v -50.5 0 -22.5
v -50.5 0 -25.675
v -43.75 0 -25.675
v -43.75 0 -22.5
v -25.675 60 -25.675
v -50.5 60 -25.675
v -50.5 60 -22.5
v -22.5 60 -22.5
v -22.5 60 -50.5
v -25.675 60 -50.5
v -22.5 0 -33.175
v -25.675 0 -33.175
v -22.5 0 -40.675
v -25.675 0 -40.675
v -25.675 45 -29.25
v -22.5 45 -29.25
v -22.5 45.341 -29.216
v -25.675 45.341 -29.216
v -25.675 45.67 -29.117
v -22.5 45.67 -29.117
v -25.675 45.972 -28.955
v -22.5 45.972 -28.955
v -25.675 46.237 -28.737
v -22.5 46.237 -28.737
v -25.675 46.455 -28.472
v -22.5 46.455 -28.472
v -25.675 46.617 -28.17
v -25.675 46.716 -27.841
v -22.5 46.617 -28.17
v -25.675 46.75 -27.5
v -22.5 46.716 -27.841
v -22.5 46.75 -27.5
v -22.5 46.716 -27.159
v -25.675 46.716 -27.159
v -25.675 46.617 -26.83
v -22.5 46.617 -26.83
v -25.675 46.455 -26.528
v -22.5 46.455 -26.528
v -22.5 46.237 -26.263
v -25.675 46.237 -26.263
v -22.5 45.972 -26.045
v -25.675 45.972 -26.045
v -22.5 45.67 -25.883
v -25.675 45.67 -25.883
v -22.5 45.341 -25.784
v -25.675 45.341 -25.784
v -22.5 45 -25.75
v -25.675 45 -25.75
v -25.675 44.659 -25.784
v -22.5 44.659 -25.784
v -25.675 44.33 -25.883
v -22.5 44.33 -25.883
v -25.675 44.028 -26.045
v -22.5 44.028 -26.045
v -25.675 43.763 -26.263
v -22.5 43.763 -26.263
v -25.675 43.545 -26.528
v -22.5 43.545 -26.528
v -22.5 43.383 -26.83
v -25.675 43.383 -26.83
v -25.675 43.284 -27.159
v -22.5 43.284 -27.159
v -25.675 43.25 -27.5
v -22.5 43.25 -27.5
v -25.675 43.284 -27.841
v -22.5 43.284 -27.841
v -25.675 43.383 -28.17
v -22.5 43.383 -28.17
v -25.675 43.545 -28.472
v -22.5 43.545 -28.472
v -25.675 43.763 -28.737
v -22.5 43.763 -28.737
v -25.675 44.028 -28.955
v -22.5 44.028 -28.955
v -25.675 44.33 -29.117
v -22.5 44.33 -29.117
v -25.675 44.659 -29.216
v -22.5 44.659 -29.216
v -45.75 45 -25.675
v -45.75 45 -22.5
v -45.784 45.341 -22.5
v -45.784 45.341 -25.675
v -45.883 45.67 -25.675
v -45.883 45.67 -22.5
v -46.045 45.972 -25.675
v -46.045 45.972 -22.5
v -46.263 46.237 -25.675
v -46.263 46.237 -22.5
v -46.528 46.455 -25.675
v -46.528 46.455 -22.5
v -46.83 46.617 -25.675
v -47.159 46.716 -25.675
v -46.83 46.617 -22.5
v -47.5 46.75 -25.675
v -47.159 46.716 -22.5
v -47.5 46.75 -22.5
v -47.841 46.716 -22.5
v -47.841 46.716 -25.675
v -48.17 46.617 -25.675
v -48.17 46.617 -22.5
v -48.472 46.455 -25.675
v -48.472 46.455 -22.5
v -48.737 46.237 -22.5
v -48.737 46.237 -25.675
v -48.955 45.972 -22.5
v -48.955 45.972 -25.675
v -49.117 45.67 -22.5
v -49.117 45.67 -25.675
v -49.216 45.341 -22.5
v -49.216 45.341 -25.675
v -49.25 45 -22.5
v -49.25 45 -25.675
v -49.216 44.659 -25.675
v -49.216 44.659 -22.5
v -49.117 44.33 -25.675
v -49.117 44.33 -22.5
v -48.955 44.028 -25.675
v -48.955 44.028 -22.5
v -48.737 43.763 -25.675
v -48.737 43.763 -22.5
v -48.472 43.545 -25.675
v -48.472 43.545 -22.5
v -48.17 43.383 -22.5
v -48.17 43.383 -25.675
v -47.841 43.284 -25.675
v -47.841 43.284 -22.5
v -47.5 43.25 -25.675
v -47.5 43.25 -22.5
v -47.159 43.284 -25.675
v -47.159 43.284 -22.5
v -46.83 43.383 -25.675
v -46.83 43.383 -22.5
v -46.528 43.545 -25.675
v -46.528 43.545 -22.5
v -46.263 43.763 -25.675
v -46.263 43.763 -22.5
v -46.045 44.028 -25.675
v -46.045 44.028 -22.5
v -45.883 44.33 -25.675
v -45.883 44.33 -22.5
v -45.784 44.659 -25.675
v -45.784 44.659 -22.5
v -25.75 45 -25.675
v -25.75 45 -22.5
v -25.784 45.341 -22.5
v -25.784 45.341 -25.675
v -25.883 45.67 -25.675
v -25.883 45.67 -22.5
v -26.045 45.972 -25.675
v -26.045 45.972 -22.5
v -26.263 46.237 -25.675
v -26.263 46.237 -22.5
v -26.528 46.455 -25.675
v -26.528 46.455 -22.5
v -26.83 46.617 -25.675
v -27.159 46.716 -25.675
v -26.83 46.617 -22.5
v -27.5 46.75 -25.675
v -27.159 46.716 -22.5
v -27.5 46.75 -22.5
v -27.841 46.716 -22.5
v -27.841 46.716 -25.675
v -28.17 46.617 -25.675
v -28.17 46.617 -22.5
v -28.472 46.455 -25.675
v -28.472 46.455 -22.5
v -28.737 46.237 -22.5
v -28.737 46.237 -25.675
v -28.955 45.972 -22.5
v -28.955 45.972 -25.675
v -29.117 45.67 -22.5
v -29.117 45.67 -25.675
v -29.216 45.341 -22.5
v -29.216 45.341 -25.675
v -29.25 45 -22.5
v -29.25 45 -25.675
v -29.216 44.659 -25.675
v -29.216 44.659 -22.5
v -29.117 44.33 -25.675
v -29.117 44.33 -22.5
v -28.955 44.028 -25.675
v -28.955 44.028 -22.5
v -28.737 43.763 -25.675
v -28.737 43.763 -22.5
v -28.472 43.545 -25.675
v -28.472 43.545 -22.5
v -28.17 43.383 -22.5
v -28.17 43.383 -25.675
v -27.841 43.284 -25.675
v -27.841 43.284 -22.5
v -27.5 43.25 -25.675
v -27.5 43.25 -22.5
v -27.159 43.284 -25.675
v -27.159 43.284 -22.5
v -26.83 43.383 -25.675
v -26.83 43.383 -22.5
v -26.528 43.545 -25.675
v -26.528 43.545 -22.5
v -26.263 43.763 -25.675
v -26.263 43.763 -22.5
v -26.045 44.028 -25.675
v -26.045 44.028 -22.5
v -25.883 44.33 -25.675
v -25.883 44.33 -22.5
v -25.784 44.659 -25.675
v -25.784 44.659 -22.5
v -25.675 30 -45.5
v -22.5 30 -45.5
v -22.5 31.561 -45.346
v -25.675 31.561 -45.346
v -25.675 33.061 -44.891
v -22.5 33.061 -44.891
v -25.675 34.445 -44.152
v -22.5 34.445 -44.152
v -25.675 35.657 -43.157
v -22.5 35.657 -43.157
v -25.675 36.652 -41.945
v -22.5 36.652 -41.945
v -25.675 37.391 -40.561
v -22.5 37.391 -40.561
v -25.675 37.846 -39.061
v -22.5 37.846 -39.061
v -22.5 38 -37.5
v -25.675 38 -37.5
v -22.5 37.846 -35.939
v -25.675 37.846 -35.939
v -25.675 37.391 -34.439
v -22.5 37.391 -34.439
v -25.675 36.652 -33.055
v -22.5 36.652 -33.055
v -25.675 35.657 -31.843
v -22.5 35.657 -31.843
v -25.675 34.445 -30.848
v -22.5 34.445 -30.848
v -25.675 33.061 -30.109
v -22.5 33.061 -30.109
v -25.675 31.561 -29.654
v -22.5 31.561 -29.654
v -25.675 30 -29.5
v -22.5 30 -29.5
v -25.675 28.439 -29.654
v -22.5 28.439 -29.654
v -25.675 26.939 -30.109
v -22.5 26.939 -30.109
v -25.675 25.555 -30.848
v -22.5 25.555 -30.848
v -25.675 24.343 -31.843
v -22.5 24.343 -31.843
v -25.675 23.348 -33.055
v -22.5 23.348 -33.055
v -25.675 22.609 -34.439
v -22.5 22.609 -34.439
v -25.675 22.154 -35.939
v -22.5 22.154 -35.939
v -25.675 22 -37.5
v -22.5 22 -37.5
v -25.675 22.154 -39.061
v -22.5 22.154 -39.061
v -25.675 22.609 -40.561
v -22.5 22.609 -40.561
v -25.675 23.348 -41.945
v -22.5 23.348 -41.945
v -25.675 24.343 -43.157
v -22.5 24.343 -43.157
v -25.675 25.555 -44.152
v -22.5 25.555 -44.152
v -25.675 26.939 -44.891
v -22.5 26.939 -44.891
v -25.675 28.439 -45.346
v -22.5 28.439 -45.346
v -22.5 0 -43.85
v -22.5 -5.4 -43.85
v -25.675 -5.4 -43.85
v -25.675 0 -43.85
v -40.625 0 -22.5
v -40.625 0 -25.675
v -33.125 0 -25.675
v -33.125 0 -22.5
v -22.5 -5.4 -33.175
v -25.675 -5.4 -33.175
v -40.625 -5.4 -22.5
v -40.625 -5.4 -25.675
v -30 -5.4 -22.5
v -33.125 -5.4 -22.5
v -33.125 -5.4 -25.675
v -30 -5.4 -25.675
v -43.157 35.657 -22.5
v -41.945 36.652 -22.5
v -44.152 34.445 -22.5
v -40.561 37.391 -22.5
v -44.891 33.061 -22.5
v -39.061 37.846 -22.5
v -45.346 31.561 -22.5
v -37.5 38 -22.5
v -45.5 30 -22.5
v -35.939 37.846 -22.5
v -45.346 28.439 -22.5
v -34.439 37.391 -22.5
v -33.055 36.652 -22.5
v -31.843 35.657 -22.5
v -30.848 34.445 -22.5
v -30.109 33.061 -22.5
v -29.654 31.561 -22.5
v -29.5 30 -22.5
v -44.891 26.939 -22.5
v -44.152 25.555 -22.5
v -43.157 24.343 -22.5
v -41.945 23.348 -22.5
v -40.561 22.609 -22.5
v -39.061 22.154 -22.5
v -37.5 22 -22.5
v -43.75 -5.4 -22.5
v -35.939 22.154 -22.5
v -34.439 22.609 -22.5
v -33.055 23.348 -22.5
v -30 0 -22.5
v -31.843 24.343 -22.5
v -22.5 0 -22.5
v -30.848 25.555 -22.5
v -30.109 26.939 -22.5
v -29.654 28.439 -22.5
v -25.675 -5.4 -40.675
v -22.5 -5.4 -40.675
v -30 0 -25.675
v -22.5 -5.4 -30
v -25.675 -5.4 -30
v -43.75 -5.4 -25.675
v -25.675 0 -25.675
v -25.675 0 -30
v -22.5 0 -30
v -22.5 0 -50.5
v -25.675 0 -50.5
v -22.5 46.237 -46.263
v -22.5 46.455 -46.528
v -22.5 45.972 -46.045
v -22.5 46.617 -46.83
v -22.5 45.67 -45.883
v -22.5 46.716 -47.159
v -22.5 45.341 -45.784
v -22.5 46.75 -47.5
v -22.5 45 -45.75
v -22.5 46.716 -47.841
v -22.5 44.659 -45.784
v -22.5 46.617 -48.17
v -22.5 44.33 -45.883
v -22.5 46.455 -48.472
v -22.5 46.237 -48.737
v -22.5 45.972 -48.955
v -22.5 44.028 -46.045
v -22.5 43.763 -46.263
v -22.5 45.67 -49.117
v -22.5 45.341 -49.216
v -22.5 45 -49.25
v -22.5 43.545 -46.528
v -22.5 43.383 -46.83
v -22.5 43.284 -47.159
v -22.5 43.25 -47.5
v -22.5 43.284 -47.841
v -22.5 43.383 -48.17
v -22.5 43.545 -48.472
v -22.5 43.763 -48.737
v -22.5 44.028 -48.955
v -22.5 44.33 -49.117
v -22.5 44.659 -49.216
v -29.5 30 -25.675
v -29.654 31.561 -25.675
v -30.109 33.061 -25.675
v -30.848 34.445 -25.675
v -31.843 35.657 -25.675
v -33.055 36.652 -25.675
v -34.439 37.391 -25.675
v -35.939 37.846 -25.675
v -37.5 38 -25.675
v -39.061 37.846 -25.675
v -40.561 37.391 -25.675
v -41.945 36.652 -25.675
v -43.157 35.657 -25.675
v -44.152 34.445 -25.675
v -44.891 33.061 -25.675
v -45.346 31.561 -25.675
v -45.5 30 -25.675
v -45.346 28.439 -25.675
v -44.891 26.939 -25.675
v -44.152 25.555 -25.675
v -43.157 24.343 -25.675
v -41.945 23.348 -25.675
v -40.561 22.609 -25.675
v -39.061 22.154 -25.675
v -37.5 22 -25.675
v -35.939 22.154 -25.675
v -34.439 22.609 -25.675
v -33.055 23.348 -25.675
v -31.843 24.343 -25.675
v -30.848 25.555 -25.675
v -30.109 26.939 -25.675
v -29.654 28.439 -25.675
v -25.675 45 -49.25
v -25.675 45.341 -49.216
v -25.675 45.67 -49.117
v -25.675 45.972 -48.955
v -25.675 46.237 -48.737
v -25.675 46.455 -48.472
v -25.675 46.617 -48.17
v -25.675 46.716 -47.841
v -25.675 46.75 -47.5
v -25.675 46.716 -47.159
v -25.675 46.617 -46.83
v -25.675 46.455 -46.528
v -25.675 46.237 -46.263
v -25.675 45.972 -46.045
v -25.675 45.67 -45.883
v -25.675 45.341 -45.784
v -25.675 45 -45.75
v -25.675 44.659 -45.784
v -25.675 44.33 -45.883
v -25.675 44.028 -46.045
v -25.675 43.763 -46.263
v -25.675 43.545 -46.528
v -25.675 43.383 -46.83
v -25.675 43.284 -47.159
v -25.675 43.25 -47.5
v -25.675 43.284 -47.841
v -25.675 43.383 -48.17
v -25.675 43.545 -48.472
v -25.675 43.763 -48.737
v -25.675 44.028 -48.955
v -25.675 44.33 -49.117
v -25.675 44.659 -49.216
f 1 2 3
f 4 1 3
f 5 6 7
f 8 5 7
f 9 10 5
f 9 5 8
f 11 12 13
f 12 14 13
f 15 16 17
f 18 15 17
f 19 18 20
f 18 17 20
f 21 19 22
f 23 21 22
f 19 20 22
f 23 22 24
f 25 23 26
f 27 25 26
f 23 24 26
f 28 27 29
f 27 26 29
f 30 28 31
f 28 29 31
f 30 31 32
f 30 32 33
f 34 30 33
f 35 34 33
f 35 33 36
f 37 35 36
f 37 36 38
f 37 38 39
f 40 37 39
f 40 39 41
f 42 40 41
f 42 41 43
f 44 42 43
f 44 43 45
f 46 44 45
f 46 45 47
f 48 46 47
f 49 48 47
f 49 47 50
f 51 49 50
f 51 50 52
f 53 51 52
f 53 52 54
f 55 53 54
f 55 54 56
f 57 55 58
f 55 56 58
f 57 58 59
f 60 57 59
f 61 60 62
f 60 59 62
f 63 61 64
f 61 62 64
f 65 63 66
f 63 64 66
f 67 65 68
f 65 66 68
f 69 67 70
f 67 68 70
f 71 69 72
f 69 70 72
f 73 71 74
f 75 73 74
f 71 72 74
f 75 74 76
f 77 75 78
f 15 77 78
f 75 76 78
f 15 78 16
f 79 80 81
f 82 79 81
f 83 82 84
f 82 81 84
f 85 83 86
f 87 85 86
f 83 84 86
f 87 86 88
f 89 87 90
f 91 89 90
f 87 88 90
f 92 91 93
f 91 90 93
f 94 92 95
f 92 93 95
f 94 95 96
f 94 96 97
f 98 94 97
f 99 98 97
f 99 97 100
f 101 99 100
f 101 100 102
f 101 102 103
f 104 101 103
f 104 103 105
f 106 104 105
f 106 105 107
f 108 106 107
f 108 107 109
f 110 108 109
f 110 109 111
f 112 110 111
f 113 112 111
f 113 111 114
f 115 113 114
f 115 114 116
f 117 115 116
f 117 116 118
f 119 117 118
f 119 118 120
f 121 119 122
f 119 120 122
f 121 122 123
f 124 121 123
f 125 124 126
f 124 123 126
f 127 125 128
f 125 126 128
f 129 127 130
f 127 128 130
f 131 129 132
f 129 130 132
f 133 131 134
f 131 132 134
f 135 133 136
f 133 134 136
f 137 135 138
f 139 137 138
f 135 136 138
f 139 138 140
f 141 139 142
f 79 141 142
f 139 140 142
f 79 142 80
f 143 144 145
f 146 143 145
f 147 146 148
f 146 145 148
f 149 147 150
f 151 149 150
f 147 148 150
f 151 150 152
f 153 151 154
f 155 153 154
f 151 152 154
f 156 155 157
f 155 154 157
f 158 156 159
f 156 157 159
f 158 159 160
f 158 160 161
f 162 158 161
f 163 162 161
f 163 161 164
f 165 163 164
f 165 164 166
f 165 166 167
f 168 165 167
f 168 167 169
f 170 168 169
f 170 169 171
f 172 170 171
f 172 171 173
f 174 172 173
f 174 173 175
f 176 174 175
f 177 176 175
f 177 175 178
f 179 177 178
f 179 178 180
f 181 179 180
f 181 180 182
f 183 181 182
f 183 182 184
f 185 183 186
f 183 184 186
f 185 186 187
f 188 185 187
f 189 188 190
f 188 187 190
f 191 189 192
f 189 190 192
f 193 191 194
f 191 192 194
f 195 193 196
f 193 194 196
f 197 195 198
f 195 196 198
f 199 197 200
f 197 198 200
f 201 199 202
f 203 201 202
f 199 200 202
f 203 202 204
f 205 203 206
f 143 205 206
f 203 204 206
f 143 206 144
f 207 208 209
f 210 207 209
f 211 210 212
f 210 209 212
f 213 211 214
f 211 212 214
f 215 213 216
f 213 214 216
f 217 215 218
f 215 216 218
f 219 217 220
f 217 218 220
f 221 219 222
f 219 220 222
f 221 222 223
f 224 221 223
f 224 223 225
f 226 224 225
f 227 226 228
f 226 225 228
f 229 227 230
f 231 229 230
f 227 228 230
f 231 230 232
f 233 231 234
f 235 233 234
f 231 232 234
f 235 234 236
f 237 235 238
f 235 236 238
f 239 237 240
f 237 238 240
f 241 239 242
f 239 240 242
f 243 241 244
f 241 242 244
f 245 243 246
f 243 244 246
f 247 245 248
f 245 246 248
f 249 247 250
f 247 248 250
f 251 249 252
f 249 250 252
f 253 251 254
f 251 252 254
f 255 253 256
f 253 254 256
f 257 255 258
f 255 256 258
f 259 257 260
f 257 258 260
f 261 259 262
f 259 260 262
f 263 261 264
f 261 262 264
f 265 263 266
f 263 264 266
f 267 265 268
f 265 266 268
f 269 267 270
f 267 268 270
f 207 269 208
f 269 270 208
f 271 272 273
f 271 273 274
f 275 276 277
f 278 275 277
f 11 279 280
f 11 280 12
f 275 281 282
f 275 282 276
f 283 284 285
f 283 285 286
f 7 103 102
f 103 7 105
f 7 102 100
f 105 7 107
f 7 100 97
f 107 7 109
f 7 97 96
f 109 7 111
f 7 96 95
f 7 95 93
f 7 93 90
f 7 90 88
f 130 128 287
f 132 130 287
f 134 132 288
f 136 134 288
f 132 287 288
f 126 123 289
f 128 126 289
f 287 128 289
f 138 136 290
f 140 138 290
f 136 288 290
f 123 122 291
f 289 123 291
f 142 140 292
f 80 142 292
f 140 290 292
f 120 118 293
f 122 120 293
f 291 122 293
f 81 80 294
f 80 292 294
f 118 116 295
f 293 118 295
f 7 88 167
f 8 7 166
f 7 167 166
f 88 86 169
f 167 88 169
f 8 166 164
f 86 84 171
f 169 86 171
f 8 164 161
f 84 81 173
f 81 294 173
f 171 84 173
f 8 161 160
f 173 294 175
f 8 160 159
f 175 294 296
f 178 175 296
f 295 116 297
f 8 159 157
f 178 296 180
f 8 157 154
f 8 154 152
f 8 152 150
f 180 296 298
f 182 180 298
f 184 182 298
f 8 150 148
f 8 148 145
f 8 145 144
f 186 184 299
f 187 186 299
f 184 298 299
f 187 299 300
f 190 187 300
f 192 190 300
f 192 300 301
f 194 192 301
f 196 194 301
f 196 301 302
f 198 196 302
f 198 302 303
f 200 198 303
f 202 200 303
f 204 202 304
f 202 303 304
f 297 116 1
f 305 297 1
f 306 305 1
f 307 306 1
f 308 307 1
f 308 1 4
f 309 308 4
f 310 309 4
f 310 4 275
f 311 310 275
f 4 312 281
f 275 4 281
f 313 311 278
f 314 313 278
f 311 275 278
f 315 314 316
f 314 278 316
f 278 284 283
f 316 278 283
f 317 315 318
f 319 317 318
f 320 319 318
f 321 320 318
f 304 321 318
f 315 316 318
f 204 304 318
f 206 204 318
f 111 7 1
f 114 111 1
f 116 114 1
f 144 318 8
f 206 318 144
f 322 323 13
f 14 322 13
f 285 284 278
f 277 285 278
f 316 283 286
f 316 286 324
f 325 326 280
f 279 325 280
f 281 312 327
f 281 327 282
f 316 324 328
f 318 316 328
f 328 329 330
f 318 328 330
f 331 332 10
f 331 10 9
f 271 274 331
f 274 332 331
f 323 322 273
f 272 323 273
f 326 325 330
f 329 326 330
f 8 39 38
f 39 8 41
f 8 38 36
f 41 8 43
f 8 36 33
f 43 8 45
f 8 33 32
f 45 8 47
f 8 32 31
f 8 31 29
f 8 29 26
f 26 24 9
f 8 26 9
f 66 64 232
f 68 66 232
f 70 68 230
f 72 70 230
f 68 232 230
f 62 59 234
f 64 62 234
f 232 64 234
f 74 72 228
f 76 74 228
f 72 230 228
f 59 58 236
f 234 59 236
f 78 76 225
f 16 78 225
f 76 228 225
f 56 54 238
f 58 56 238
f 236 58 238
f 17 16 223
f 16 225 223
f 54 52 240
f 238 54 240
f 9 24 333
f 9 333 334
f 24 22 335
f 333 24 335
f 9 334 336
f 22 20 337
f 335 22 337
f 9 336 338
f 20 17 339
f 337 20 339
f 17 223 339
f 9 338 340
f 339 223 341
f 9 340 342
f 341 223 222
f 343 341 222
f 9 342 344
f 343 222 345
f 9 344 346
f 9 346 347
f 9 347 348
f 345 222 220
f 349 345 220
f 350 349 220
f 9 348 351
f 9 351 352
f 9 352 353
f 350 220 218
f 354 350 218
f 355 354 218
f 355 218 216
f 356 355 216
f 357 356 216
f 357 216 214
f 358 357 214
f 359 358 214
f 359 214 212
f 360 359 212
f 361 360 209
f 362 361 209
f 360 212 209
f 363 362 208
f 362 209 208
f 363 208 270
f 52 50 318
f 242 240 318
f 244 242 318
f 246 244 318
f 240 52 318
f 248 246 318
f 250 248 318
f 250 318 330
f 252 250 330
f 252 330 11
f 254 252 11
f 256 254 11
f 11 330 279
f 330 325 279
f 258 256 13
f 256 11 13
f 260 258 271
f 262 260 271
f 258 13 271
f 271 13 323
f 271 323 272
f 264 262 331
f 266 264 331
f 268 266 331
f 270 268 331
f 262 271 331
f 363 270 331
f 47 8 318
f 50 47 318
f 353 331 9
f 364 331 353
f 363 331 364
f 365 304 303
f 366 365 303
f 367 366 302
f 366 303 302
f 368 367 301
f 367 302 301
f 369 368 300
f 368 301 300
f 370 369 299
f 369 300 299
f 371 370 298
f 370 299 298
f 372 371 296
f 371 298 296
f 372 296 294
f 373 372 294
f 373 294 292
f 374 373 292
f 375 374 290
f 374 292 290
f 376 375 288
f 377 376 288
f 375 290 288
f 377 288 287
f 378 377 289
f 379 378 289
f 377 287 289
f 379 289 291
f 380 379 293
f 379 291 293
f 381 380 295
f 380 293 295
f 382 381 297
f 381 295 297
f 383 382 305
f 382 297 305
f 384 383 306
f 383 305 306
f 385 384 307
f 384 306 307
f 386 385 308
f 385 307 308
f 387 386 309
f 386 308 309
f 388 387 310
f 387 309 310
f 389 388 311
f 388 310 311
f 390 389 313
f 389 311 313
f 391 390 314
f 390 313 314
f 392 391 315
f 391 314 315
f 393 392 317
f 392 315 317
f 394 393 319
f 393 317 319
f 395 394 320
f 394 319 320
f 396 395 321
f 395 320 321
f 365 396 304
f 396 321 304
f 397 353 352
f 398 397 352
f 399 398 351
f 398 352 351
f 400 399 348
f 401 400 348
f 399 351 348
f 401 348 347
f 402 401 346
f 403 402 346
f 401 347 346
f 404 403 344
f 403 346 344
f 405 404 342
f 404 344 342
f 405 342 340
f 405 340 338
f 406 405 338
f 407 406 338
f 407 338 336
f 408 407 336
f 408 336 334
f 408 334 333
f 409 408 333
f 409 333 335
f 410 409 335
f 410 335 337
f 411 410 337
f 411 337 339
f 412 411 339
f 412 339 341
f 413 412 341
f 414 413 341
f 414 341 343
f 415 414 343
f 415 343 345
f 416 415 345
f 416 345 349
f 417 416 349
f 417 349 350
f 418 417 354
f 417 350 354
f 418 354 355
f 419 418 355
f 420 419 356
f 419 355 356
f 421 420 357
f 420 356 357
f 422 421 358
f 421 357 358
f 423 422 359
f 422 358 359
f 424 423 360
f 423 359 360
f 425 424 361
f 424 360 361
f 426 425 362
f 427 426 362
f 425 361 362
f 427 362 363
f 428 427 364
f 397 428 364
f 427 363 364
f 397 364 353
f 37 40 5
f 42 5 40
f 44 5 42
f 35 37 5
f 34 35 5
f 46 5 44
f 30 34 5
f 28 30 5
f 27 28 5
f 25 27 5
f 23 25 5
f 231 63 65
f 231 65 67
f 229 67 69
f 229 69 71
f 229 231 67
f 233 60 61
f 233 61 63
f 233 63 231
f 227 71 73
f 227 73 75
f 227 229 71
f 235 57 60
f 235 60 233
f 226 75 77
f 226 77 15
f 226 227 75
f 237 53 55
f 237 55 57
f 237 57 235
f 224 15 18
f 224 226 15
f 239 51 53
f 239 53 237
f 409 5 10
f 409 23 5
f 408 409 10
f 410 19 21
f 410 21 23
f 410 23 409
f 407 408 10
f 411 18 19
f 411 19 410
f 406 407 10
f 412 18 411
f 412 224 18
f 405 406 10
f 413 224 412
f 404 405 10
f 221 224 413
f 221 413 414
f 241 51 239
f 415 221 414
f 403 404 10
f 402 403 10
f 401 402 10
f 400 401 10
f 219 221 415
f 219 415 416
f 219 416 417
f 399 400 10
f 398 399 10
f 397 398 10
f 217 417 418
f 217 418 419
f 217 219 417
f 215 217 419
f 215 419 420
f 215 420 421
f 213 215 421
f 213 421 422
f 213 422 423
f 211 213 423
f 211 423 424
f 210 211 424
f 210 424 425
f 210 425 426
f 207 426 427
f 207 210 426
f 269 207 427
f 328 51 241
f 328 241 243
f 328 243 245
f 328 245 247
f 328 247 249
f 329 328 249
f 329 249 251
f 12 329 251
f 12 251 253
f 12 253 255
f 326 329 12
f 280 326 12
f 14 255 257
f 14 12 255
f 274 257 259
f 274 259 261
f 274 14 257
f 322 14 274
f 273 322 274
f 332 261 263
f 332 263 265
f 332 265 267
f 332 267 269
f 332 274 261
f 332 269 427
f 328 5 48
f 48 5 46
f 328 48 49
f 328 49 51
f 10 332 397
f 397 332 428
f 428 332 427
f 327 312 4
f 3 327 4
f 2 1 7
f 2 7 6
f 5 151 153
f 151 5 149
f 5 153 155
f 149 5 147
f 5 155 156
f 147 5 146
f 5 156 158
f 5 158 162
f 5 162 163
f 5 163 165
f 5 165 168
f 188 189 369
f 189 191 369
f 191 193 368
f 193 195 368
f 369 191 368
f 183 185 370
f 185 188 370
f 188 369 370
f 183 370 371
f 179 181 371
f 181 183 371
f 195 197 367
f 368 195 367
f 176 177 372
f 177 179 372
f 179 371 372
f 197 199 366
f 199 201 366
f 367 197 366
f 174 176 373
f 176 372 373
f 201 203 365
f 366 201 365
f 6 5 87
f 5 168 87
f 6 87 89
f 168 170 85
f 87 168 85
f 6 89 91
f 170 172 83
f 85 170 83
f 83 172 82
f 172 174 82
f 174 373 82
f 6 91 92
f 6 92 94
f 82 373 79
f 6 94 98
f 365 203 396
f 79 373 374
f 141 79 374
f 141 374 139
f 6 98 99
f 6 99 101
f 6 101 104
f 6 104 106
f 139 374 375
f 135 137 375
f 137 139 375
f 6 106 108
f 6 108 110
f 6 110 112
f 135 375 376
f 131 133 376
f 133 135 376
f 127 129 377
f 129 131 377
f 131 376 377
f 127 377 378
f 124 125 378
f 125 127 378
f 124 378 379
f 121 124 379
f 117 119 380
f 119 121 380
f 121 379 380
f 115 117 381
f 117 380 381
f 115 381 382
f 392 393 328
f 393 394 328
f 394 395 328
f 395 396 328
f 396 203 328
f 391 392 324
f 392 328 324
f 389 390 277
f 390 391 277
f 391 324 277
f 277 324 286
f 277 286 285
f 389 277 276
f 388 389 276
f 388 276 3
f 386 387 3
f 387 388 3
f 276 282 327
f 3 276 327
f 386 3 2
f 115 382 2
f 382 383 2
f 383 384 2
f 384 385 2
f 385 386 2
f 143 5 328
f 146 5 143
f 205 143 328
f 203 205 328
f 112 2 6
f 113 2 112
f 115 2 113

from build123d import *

# Parameters (mm, degrees)
SKETCH1_W           = 24.825
SKETCH1_H           = 3.175
SKETCH1_W_2         = 3.175
SKETCH1_H_2         = 24.825
BOSS_EXTRUDE1_DEPTH = 60
SKETCH2_W           = 3.125
SKETCH2_H           = 5.4
BOSS_EXTRUDE4_DEPTH = 3.175
SKETCH4_R           = 8
CUT_EXTRUDE1_DEPTH  = 3.175
SKETCH3_R           = 8
CUT_EXTRUDE2_DEPTH  = 3.175
SKETCH5_W           = 3.175
SKETCH5_H           = 5.4
BOSS_EXTRUDE5_DEPTH = 3.175
SKETCH6_R           = 1.75
CUT_EXTRUDE3_DEPTH  = 10
SKETCH7_R           = 1.75
CUT_EXTRUDE4_DEPTH  = 10


with BuildPart() as part:
    # Sketch1 → Boss-Extrude1 (new body)
    with BuildSketch(Plane(origin=(0, 0, 0), x_dir=(1, 0, 0), z_dir=(0, 1, 0))):
        with Locations((-38.0875, 24.0875)):
            Rectangle(SKETCH1_W, SKETCH1_H)
        with Locations((-24.0875, 24.0875)):
            Rectangle(SKETCH1_W_2, SKETCH1_H)
        with Locations((-24.0875, 38.0875)):
            Rectangle(SKETCH1_W_2, SKETCH1_H_2)
    extrude(amount=BOSS_EXTRUDE1_DEPTH)

    # Sketch2 → Boss-Extrude4 (add)
    with BuildSketch(Plane.XY.offset(-22.5)):
        with Locations((-42.1875, -2.7)):
            Rectangle(SKETCH2_W, SKETCH2_H)
        with Locations((-31.5625, -2.7)):
            Rectangle(SKETCH2_W, SKETCH2_H)
    extrude(amount=-BOSS_EXTRUDE4_DEPTH)

    # Sketch4 → Cut-Extrude1 (cut)
    with BuildSketch(Plane.XY.offset(-22.5)):
        with Locations((-37.5, 30)):
            Circle(SKETCH4_R)
    extrude(amount=-CUT_EXTRUDE1_DEPTH, mode=Mode.SUBTRACT)

    # Sketch3 → Cut-Extrude2 (cut)
    with BuildSketch(Plane(origin=(-22.5, 0, 0), x_dir=(0, 0, -1), z_dir=(1, 0, 0))):
        with Locations((37.5, 30)):
            Circle(SKETCH3_R)
    extrude(amount=-CUT_EXTRUDE2_DEPTH, mode=Mode.SUBTRACT)

    # Sketch5 → Boss-Extrude5 (add)
    with BuildSketch(Plane(origin=(-22.5, 0, 0), x_dir=(0, 0, -1), z_dir=(1, 0, 0))):
        with Locations((42.2625, -2.7)):
            Rectangle(SKETCH5_W, SKETCH5_H)
        with Locations((31.5875, -2.7)):
            Rectangle(SKETCH5_W, SKETCH5_H)
    extrude(amount=-BOSS_EXTRUDE5_DEPTH)

    # Sketch6 → Cut-Extrude3 (cut)
    with BuildSketch(Plane.XY.offset(-22.5)):
        with Locations((-47.5, 45)):
            Circle(SKETCH6_R)
        with Locations((-27.5, 45)):
            Circle(SKETCH6_R)
    extrude(amount=-CUT_EXTRUDE3_DEPTH, mode=Mode.SUBTRACT)

    # Sketch7 → Cut-Extrude4 (cut)
    with BuildSketch(Plane(origin=(-22.5, 0, 0), x_dir=(0, 0, -1), z_dir=(1, 0, 0))):
        with Locations((47.5, 45)):
            Circle(SKETCH7_R)
        with Locations((27.5, 45)):
            Circle(SKETCH7_R)
    extrude(amount=-CUT_EXTRUDE4_DEPTH, mode=Mode.SUBTRACT)


solid = part.part
